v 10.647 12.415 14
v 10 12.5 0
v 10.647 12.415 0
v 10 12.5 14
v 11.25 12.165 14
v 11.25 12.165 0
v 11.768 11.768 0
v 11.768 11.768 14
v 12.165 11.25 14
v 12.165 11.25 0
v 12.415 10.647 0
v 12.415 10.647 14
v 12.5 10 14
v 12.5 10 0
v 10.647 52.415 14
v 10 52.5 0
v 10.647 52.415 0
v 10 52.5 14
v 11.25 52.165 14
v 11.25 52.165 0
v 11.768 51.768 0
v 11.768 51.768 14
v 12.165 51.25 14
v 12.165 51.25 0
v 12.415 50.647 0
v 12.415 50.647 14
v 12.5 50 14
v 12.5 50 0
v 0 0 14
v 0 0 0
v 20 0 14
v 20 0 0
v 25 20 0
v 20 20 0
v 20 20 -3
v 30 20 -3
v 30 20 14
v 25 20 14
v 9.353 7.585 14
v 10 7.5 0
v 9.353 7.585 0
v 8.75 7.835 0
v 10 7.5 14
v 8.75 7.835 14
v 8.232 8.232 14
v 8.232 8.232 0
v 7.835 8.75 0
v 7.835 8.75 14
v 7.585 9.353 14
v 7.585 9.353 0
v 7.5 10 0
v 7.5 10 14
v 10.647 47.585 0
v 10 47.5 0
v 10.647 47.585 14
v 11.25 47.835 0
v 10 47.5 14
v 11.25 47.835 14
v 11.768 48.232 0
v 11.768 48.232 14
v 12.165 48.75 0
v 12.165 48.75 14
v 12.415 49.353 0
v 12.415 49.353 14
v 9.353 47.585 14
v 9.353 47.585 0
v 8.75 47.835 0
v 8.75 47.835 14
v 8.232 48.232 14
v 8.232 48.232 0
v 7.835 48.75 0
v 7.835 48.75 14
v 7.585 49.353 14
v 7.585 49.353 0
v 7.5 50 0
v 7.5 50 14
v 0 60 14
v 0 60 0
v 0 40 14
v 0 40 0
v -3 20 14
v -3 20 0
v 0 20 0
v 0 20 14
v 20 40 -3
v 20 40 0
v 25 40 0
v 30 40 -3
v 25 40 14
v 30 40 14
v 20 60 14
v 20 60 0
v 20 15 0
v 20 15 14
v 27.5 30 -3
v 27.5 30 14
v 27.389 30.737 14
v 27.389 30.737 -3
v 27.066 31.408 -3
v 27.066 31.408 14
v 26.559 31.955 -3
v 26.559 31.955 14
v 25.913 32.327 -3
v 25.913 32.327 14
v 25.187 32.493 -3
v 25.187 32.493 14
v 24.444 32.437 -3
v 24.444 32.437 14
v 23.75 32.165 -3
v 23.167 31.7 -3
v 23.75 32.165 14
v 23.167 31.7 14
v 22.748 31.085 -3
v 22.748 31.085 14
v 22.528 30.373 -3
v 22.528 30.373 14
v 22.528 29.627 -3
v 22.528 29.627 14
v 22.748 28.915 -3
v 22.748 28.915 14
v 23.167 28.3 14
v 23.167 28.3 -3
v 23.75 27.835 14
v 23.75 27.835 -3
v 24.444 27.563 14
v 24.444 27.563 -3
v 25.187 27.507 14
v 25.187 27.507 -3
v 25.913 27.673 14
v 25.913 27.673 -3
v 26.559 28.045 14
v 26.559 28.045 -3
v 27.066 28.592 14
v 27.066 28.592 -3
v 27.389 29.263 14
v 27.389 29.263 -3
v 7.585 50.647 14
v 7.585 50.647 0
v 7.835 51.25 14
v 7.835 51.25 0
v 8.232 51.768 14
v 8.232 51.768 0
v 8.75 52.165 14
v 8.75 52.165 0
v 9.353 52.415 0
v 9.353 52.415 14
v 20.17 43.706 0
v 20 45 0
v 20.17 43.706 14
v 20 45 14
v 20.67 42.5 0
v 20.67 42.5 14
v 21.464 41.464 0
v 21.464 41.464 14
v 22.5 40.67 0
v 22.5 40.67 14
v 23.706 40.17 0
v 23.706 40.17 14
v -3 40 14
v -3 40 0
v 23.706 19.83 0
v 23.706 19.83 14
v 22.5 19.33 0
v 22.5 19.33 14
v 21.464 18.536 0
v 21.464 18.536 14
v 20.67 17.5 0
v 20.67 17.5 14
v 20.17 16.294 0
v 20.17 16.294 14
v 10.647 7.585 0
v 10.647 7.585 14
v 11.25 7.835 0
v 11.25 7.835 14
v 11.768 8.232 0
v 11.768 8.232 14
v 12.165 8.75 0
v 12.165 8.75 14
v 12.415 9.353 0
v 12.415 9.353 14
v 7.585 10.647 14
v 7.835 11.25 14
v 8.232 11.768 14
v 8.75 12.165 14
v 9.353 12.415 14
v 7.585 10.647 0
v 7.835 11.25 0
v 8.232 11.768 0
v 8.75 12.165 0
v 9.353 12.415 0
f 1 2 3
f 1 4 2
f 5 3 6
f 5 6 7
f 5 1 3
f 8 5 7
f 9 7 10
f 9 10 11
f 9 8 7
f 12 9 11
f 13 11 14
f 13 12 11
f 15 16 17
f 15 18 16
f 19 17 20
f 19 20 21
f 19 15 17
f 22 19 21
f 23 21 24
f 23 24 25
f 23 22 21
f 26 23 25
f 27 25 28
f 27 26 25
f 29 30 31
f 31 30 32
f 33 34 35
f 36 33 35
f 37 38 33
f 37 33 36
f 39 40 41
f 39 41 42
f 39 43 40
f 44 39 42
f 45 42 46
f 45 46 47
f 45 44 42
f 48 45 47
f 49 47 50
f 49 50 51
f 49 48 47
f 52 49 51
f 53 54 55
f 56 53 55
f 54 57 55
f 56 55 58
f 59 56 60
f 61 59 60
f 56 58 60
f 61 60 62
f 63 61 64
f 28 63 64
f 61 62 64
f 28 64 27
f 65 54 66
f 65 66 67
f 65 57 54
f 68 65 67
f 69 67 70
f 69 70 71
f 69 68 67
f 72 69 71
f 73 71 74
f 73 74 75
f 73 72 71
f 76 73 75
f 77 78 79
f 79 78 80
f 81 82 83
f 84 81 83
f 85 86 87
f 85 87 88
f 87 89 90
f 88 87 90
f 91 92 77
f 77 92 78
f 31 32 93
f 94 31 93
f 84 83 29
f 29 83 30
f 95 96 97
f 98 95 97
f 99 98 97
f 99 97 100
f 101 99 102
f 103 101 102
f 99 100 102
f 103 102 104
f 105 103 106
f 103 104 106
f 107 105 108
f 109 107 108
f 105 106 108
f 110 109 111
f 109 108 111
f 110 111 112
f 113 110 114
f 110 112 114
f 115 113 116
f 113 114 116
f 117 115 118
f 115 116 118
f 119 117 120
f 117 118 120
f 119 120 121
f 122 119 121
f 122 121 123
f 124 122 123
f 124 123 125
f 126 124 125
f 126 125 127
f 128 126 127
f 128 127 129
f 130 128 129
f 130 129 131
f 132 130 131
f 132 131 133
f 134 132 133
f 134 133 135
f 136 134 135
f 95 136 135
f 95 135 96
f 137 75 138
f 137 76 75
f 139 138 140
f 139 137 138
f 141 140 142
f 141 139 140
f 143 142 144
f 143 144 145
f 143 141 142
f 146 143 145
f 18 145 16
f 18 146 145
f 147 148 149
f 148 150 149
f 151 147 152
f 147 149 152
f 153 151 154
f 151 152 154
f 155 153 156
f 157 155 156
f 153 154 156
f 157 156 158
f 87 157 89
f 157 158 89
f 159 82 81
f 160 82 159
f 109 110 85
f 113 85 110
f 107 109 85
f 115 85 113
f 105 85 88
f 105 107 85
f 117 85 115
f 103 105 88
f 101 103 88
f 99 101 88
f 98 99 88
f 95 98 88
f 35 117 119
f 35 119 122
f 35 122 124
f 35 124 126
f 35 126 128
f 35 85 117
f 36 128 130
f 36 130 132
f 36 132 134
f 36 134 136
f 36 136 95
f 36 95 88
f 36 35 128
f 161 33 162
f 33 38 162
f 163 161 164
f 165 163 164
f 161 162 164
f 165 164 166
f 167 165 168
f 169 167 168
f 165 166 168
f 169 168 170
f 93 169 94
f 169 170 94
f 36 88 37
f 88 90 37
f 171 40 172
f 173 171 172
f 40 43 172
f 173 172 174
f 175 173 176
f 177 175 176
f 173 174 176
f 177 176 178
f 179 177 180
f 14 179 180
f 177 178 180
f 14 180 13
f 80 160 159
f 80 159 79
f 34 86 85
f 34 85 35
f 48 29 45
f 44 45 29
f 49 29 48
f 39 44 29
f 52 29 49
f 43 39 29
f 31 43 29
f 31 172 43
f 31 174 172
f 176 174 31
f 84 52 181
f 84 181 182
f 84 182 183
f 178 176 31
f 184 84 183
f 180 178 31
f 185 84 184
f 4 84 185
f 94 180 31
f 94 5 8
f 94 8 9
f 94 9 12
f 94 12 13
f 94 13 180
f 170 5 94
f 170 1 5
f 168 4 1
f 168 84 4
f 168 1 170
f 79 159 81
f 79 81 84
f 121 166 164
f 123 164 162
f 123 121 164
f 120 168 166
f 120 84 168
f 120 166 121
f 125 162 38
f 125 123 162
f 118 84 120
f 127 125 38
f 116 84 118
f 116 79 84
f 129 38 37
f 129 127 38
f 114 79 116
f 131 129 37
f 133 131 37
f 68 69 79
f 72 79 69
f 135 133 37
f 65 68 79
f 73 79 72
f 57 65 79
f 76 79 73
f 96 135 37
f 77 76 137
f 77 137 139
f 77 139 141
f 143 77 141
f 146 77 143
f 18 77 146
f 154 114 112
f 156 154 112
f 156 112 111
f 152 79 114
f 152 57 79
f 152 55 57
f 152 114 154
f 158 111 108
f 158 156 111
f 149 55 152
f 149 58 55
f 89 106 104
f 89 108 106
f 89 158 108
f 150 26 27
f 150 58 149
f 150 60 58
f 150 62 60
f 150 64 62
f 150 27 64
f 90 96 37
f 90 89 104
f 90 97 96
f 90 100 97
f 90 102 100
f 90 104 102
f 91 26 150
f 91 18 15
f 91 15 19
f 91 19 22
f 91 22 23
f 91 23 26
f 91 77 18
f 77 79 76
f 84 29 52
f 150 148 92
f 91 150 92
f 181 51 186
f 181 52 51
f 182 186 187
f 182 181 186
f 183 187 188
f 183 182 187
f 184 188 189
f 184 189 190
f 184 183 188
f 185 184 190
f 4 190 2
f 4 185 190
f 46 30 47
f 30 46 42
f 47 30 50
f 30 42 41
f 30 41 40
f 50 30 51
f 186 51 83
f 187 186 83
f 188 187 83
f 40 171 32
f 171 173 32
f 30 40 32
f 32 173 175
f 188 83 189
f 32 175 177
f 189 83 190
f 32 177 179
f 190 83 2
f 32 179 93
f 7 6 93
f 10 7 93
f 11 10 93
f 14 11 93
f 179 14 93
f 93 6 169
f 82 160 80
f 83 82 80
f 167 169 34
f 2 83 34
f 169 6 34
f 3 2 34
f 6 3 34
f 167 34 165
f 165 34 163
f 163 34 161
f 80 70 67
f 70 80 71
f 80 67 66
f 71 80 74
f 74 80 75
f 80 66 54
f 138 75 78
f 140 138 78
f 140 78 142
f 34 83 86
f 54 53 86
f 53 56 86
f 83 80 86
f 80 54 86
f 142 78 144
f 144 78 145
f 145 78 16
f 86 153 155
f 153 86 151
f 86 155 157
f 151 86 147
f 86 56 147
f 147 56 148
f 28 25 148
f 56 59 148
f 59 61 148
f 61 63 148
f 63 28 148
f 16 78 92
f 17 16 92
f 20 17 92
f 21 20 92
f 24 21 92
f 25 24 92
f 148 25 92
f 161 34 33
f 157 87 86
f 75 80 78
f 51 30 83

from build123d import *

# Parameters (mm, degrees)
F0_W     = 5
F0_H     = 5
F0_W_2   = 3
F0_H_2   = 20
F0_W_3   = 10
F1_DEPTH = 14
F2_W     = 10
F2_H     = 20
F3_DEPTH = 3
F4_R     = 5
F5_R     = 5
F6_R     = 2.49999
F7_R     = 2.49999
F8_R     = 2.5
F9_DEPTH = 25


# Not quite as in the source:
# - a fillet or chamfer is up to 0.001 mm smaller than in the source, because OpenCascade refuses the exact size


with BuildPart() as f1:
    # F0 (on Top) → F1 (new body)
    with BuildSketch(Plane.XY):
        Polygon((0, 20), (0, 0), (20, 0), (20, 20), (20, 40), (20, 60), (0, 60), (0, 40), align=None)
        with Locations((10, 10)):
            Rectangle(F0_W, F0_H, mode=Mode.SUBTRACT)
        with Locations((10, 50)):
            Rectangle(F0_W, F0_H, mode=Mode.SUBTRACT)
        with Locations((-1.5, 30)):
            Rectangle(F0_W_2, F0_H_2)
        with Locations((25, 30)):
            Rectangle(F0_W_3, F0_H_2)
    extrude(amount=F1_DEPTH)

    # F2 (on face) → F3 (join)
    with BuildSketch(Plane(origin=(0, 0, 0), x_dir=(1, 0, 0), z_dir=(0, 0, -1))):
        with Locations((25, -30)):
            Rectangle(F2_W, F2_H)
    extrude(amount=F3_DEPTH)

    # F4
    f4_edges = [f1.edges().sort_by_distance(p)[0] for p in [
        (20, 40, 7),
    ]]
    fillet(f4_edges, radius=F4_R)

    # F5
    f5_edges = [f1.edges().sort_by_distance(p)[0] for p in [
        (20, 20, 7),
    ]]
    fillet(f5_edges, radius=F5_R)

    # F6 (radius 2.5 in the source; OpenCascade refuses exactly that, so slightly less here)
    f6_edges = [f1.edges().sort_by_distance(p)[0] for p in [
        (7.5, 7.5, 7),
        (7.5, 12.5, 7),
        (12.5, 12.5, 7),
        (12.5, 7.5, 7),
    ]]
    fillet(f6_edges, radius=F6_R)

    # F7 (radius 2.5 in the source; OpenCascade refuses exactly that, so slightly less here)
    f7_edges = [f1.edges().sort_by_distance(p)[0] for p in [
        (12.5, 47.5, 7),
        (7.5, 47.5, 7),
        (7.5, 52.5, 7),
        (12.5, 52.5, 7),
    ]]
    fillet(f7_edges, radius=F7_R)

    # F8 (on face) → F9 (cut)
    with BuildSketch(Plane.XY.offset(14)):
        with Locations((25, 30)):
            Circle(F8_R)
    extrude(amount=-F9_DEPTH, mode=Mode.SUBTRACT)


solid = f1.part
